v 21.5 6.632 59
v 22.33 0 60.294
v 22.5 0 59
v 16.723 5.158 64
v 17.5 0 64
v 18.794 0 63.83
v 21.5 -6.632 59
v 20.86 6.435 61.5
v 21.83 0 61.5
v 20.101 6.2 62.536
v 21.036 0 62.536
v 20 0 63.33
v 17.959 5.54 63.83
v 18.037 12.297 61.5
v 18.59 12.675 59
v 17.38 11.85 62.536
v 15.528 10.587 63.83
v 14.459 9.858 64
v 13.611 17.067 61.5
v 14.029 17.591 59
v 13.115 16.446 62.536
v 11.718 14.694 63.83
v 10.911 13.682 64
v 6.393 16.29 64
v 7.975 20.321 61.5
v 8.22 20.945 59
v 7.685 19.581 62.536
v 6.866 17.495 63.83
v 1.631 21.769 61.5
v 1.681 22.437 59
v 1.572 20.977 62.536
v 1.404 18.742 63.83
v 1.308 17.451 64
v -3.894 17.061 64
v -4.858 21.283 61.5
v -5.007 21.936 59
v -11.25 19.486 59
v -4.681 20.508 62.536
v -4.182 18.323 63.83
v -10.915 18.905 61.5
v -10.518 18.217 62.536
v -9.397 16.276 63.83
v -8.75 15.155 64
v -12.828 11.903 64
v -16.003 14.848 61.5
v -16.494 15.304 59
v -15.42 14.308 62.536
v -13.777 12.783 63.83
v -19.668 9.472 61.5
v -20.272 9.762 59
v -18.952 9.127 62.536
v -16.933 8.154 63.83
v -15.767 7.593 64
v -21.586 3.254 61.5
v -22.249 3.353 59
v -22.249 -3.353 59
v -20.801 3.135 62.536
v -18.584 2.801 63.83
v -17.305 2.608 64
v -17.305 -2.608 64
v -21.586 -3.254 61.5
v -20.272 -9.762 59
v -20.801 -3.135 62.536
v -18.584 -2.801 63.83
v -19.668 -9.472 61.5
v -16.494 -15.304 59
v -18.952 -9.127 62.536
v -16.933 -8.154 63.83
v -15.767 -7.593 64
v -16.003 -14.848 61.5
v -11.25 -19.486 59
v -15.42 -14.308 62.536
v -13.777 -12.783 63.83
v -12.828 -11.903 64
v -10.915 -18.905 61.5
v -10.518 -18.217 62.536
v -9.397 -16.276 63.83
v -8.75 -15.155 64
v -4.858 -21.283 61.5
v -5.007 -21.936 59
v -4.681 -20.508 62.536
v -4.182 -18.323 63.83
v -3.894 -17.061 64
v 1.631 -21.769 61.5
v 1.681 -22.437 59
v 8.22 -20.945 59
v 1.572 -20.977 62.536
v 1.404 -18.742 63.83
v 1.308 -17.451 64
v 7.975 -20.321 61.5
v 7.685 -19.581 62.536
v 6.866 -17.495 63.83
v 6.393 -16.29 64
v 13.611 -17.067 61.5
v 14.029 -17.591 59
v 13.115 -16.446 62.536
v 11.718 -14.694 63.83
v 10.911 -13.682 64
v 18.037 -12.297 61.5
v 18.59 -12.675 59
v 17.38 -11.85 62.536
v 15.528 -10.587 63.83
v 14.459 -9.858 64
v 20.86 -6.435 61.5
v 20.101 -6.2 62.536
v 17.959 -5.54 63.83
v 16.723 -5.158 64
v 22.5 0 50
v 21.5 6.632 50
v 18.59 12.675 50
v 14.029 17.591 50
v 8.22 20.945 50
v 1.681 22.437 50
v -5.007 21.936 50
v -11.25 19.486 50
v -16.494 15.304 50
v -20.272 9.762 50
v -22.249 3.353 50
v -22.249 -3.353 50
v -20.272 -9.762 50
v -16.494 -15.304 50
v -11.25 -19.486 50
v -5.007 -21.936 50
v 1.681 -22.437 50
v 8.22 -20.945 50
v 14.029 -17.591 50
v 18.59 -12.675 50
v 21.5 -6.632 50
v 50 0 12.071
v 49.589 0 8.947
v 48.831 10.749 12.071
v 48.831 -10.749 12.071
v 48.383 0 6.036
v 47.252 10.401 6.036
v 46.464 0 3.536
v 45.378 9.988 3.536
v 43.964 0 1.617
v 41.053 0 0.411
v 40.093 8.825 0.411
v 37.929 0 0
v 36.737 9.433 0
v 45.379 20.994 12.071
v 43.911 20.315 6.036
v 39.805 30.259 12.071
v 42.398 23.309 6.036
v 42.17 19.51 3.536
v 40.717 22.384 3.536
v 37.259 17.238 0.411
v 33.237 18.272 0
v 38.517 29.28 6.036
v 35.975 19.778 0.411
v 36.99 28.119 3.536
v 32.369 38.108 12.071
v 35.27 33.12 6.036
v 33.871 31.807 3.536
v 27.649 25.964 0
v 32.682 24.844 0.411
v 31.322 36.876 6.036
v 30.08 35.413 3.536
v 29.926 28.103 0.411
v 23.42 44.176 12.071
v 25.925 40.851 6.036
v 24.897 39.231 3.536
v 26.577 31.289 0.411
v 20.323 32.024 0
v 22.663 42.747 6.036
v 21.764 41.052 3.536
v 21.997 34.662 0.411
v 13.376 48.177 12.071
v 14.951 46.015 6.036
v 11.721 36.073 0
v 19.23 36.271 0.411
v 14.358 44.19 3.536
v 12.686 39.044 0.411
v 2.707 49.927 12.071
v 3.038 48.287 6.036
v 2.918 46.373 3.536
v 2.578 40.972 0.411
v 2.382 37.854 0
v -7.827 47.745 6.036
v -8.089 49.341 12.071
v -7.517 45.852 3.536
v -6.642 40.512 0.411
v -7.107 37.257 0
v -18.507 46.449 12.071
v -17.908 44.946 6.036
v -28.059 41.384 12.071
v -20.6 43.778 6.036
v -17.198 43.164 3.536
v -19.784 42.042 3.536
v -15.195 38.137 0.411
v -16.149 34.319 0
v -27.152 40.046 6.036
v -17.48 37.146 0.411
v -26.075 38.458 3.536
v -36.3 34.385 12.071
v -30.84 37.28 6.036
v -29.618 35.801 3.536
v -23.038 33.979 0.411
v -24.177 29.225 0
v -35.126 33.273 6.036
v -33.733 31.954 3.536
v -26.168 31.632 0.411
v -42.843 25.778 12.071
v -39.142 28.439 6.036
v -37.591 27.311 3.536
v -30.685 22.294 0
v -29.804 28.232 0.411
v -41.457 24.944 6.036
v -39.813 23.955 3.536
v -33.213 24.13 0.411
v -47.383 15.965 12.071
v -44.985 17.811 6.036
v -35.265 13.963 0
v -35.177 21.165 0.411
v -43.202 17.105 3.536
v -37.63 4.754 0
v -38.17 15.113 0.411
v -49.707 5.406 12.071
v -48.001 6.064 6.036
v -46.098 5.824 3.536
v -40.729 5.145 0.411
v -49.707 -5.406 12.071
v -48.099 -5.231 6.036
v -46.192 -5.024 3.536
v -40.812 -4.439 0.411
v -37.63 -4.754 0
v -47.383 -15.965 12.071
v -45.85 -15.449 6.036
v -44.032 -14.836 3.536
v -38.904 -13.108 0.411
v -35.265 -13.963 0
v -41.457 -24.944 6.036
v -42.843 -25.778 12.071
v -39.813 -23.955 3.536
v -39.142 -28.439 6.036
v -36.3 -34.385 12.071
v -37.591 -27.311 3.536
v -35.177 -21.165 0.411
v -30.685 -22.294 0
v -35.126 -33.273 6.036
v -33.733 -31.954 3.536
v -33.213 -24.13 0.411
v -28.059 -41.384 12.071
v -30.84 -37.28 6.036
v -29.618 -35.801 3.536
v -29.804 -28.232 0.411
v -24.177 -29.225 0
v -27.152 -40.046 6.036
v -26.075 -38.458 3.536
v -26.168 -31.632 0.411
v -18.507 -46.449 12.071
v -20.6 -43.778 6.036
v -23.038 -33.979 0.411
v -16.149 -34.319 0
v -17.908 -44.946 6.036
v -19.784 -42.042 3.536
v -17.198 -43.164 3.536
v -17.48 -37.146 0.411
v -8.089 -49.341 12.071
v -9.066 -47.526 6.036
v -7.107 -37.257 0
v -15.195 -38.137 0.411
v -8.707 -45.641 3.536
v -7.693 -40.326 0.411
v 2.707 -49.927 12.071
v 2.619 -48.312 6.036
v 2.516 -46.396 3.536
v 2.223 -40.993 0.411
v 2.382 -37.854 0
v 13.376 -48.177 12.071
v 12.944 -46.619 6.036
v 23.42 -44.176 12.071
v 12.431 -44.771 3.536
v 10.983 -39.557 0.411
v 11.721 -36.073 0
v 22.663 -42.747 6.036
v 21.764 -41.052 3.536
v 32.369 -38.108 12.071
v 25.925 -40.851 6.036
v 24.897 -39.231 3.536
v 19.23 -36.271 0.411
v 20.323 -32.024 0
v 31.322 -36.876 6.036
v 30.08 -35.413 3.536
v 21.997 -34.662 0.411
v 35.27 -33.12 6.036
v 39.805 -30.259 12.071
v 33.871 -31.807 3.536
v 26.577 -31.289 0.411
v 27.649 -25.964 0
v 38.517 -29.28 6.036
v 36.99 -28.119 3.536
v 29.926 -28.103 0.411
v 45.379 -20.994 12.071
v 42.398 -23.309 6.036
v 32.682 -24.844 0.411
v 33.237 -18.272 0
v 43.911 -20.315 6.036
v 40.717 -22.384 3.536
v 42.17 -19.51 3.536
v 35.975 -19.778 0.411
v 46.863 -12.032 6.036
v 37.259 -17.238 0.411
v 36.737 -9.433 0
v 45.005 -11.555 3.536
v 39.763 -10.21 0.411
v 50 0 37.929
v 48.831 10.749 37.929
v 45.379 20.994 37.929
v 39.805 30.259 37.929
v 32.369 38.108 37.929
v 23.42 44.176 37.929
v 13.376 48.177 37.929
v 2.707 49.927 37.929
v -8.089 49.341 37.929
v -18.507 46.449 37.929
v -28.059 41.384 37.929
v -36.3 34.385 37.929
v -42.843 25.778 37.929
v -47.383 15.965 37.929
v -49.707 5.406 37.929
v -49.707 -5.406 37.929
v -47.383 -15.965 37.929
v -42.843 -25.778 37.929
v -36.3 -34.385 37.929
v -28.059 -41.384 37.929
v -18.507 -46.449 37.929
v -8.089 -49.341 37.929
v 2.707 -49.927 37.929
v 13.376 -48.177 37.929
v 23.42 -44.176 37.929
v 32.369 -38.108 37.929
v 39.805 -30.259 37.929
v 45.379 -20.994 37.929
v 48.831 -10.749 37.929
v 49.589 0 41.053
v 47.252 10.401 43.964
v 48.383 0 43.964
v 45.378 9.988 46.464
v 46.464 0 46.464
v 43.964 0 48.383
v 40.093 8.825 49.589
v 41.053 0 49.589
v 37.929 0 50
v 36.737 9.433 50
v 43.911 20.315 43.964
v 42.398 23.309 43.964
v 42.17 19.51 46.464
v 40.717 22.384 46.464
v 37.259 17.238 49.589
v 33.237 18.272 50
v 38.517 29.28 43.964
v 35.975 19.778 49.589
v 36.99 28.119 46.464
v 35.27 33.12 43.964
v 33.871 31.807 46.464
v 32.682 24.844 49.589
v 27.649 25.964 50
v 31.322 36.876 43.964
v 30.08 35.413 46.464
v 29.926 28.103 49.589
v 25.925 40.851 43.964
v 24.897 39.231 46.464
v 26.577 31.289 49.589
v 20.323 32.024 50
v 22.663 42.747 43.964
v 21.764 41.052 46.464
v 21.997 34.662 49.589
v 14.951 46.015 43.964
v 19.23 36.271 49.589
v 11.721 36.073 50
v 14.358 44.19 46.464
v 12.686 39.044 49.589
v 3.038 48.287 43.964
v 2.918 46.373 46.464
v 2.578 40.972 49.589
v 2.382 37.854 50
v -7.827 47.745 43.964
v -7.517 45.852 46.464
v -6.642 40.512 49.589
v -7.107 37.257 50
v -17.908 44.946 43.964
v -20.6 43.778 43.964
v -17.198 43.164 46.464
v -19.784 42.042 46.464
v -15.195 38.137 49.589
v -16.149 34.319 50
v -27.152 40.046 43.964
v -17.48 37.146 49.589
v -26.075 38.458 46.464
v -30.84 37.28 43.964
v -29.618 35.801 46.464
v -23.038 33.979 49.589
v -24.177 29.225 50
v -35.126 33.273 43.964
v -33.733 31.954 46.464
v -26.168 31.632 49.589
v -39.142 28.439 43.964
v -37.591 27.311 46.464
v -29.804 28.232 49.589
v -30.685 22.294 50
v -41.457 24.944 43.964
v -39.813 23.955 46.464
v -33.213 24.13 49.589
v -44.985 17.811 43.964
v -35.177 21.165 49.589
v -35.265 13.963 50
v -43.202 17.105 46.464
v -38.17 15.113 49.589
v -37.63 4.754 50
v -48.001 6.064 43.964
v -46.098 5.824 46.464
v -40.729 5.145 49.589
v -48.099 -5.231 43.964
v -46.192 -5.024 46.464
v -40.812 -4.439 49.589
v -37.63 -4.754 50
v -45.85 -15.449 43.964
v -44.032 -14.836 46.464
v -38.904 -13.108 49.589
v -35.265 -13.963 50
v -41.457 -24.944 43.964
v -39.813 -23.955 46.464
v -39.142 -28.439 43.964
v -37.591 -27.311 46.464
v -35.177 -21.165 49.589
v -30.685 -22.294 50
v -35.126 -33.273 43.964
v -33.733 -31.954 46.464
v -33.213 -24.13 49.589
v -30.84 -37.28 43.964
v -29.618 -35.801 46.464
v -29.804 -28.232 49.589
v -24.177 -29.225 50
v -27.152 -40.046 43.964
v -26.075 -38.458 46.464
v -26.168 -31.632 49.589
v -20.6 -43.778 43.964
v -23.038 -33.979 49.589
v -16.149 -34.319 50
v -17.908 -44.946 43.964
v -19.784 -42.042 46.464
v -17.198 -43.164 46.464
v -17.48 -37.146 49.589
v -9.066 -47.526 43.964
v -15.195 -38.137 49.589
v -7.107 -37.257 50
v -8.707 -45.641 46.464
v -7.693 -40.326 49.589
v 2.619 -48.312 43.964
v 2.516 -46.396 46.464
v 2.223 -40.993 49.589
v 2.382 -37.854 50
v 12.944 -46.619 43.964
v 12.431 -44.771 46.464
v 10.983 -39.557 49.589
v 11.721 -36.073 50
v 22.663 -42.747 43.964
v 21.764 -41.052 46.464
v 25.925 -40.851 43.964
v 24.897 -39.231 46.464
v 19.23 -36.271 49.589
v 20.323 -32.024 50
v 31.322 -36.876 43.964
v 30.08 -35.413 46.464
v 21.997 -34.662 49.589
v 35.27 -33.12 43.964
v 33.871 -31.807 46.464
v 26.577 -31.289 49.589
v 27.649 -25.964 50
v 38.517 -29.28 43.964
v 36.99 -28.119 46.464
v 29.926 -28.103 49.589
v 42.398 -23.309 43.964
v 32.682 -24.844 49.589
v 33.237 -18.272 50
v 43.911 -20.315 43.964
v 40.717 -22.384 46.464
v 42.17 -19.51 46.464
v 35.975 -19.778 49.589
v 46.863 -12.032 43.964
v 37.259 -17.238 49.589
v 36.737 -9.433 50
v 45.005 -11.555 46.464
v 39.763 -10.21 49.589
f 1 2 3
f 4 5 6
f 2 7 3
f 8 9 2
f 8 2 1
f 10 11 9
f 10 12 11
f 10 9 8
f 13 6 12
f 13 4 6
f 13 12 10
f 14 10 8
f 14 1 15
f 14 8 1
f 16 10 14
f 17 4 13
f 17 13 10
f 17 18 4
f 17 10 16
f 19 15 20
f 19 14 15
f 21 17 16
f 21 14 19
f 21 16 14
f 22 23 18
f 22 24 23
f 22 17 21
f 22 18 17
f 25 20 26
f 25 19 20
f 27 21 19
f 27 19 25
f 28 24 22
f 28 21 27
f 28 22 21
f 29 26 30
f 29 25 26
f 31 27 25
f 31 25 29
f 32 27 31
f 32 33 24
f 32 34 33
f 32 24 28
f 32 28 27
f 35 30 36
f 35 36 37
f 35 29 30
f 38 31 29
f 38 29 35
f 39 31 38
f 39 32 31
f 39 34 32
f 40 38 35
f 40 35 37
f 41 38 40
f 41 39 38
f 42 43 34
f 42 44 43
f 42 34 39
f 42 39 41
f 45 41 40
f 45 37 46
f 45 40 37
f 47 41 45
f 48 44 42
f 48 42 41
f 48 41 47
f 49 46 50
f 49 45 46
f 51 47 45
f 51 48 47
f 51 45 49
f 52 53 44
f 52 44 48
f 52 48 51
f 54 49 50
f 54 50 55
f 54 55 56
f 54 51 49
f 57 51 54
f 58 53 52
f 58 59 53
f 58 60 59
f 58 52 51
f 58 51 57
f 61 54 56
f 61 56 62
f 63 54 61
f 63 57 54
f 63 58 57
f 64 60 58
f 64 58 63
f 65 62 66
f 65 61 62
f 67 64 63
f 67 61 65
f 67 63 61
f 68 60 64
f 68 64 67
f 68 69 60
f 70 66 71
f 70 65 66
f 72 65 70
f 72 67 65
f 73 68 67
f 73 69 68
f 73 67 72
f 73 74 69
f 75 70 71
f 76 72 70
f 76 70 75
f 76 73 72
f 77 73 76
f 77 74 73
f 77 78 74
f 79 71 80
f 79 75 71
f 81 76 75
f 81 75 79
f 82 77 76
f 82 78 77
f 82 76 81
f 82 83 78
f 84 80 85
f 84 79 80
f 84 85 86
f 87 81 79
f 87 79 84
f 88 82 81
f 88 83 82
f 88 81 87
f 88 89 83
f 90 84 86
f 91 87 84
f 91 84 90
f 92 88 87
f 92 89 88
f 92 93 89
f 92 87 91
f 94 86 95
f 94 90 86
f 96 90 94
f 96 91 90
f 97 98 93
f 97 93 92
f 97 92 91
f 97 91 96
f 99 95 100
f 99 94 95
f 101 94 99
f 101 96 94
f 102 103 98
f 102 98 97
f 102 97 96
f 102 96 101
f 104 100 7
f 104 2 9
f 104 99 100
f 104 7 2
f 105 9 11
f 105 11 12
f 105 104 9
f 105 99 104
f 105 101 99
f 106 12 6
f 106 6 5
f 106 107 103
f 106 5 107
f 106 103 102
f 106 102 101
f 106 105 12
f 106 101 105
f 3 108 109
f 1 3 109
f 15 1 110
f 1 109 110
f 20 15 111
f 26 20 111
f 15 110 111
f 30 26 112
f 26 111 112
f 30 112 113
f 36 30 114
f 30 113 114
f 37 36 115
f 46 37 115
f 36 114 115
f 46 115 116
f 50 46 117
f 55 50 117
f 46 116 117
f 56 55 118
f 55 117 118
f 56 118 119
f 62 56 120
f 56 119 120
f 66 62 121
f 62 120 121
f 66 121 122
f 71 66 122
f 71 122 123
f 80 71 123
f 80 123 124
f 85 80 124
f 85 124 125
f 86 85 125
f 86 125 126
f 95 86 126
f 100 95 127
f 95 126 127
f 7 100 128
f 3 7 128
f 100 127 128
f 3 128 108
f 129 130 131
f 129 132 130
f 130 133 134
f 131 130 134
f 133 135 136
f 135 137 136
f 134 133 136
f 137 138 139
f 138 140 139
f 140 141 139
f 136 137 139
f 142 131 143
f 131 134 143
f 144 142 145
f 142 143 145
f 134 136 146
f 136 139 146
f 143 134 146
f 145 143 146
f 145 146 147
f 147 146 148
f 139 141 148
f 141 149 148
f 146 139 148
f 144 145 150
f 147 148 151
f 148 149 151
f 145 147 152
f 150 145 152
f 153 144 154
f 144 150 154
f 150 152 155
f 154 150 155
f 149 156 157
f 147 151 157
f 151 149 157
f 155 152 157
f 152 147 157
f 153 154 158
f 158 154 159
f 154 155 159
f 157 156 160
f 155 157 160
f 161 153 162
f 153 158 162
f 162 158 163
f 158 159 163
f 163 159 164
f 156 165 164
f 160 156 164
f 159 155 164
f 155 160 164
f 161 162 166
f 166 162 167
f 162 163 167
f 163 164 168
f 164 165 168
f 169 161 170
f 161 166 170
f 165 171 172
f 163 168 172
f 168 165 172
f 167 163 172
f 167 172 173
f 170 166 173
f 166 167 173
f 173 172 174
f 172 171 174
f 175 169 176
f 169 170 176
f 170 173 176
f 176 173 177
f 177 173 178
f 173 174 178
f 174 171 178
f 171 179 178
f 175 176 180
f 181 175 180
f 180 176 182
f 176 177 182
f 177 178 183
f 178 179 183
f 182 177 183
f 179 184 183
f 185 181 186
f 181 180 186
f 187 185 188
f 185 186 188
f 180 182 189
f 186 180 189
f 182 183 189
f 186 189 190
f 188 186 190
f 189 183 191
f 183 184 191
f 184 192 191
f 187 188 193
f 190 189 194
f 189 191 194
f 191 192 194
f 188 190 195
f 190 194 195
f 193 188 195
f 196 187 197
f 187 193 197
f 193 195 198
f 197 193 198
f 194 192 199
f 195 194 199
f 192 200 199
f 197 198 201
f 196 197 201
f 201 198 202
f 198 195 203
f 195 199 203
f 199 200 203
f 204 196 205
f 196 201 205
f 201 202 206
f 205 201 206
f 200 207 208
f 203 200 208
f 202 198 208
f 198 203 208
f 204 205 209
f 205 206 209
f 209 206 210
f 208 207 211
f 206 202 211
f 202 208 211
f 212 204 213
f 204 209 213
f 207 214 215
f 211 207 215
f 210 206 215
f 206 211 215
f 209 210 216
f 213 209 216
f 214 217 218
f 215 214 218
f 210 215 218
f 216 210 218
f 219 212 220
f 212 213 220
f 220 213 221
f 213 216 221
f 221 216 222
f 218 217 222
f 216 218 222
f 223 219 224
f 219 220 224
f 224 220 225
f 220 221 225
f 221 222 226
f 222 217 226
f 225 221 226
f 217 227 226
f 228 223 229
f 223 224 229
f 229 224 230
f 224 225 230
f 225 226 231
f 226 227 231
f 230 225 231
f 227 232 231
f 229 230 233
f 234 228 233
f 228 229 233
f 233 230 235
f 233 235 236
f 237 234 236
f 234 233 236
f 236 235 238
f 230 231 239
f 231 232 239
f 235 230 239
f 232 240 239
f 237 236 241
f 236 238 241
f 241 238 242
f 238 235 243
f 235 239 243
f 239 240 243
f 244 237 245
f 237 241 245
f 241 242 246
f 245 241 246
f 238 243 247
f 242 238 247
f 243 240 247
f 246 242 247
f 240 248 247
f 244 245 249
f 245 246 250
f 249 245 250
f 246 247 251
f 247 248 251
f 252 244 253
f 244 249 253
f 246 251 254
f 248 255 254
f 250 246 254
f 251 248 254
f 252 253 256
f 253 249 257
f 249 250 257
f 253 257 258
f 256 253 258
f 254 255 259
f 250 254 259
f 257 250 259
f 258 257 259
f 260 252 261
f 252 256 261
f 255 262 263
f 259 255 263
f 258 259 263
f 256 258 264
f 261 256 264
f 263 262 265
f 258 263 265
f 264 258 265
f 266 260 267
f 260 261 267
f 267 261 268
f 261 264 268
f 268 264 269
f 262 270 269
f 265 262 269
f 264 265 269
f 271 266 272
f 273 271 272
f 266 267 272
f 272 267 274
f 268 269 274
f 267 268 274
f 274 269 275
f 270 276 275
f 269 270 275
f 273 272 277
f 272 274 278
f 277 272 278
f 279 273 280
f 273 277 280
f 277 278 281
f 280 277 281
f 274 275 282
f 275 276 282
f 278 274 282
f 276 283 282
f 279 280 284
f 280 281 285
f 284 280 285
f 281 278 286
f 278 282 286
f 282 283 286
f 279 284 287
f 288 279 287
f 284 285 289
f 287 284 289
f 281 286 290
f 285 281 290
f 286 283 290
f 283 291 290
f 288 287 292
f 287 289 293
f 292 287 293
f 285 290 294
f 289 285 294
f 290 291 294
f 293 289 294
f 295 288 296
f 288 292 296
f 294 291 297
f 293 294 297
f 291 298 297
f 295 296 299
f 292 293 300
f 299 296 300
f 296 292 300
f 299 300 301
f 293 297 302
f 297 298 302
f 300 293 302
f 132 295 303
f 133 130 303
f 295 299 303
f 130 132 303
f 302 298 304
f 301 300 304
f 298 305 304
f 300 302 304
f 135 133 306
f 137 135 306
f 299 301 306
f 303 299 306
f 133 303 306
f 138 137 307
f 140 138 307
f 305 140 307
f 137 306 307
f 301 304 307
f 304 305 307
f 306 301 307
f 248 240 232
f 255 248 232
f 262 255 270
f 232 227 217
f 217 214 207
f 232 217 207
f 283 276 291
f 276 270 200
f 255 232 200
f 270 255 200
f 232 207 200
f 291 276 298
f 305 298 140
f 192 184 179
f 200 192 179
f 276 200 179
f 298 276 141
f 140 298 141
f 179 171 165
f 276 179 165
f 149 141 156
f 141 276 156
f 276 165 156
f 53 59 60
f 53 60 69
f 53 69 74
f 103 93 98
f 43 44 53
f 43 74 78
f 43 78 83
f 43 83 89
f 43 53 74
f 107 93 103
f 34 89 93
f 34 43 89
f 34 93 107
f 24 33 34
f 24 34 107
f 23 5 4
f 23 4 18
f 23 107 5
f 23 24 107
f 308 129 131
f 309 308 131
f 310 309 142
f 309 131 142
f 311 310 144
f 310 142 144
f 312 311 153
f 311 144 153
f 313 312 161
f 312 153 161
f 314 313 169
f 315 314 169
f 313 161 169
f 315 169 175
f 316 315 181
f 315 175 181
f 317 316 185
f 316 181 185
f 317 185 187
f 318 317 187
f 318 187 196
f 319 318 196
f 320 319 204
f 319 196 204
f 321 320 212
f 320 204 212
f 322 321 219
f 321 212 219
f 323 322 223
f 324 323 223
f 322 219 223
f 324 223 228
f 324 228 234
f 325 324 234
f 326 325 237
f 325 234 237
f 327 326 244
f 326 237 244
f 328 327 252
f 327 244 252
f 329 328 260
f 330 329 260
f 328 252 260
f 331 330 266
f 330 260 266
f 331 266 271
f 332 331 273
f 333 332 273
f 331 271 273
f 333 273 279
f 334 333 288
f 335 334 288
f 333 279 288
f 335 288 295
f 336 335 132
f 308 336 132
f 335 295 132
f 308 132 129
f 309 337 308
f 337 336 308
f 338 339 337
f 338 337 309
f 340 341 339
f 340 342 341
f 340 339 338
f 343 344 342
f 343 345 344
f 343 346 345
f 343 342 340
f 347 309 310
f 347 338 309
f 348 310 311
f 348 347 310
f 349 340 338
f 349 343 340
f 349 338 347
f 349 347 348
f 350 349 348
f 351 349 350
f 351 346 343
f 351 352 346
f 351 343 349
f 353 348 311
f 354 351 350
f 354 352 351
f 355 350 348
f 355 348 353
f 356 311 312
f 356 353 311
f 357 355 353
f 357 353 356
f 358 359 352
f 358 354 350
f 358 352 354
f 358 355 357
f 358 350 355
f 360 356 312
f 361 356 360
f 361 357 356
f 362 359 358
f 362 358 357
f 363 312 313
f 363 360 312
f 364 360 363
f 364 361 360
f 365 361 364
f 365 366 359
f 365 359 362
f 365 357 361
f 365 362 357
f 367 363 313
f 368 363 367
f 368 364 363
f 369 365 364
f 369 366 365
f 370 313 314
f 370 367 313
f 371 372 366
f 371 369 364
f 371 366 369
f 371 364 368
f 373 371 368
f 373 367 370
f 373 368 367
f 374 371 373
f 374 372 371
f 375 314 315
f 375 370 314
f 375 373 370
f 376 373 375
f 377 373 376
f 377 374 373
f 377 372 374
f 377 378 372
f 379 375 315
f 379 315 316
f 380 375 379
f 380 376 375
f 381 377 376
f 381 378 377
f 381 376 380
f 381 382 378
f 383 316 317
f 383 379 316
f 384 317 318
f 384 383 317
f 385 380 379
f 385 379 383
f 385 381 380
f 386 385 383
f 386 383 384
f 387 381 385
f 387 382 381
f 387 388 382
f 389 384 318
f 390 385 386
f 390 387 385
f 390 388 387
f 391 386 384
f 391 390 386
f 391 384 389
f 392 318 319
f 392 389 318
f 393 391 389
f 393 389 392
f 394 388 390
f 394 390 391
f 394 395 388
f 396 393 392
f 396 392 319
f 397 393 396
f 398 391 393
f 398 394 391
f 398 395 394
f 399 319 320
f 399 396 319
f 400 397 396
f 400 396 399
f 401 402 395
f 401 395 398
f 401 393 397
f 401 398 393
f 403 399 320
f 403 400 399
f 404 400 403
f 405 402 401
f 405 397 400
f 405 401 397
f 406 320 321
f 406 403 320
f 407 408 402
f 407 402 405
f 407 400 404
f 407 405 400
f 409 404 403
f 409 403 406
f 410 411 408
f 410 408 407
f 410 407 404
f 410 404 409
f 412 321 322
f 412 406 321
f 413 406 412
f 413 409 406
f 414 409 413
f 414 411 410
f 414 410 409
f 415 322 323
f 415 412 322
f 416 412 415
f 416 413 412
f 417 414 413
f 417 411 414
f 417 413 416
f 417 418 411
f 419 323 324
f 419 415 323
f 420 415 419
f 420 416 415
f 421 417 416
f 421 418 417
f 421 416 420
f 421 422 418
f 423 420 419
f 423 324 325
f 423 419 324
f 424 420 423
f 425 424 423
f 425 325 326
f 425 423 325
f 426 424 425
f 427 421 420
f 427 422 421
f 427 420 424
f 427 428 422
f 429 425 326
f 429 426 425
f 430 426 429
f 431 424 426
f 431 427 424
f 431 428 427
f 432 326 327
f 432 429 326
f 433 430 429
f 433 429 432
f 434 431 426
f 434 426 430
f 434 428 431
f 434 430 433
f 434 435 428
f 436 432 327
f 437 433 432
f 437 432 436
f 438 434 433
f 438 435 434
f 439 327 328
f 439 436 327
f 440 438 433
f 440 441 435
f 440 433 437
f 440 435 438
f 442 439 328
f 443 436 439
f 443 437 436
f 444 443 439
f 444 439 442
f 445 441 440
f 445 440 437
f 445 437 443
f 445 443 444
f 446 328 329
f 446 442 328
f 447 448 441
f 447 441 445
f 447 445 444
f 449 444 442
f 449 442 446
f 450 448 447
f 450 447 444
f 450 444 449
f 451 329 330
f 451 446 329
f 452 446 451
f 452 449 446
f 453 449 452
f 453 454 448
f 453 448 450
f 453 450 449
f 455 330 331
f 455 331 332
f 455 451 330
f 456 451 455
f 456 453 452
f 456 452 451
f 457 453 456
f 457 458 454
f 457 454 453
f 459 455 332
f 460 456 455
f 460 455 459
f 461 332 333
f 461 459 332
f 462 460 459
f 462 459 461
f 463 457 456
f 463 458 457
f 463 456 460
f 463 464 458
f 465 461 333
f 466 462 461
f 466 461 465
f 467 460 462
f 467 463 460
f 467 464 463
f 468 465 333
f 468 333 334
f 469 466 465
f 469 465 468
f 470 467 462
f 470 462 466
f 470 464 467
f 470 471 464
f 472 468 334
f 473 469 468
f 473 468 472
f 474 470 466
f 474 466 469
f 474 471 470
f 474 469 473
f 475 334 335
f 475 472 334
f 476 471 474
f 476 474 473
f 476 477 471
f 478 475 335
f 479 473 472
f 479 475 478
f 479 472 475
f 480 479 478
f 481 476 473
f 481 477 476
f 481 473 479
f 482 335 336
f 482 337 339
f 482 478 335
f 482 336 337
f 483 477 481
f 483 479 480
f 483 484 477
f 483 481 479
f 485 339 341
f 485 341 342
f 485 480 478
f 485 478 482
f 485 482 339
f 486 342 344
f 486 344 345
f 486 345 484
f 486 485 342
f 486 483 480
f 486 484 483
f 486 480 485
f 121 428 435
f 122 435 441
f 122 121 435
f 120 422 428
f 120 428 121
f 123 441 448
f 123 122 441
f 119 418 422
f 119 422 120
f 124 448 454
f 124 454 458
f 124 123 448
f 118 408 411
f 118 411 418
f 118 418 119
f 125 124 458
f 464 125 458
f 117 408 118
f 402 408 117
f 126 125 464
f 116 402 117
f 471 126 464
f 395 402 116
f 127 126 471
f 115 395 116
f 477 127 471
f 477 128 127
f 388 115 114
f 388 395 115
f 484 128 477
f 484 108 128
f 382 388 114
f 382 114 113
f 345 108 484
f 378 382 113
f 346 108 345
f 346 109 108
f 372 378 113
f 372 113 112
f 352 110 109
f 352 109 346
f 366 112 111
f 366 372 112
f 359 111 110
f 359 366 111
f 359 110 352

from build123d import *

# Parameters (mm, degrees)
F0_R     = 50
F1_DEPTH = 50
F2_R     = 12.071068
F3_R     = 22.5
F4_DEPTH = 14
F5_R     = 5


with BuildPart() as f1:
    # F0 (on Top) → F1 (new body)
    with BuildSketch(Plane.XY):
        Circle(F0_R)
    extrude(amount=F1_DEPTH)

    # F2
    f2_edges = [f1.edges().sort_by_distance(p)[0] for p in [
        (-50, 0, 50),
        (-50, 0, 0),
    ]]
    fillet(f2_edges, radius=F2_R)

    # F3 (on face) → F4 (join)
    with BuildSketch(Plane.XY.offset(50)):
        Circle(F3_R)
    extrude(amount=F4_DEPTH)

    # F5
    f5_edges = [f1.edges().sort_by_distance(p)[0] for p in [
        (-22.5, 0, 64),
    ]]
    fillet(f5_edges, radius=F5_R)


solid = f1.part
